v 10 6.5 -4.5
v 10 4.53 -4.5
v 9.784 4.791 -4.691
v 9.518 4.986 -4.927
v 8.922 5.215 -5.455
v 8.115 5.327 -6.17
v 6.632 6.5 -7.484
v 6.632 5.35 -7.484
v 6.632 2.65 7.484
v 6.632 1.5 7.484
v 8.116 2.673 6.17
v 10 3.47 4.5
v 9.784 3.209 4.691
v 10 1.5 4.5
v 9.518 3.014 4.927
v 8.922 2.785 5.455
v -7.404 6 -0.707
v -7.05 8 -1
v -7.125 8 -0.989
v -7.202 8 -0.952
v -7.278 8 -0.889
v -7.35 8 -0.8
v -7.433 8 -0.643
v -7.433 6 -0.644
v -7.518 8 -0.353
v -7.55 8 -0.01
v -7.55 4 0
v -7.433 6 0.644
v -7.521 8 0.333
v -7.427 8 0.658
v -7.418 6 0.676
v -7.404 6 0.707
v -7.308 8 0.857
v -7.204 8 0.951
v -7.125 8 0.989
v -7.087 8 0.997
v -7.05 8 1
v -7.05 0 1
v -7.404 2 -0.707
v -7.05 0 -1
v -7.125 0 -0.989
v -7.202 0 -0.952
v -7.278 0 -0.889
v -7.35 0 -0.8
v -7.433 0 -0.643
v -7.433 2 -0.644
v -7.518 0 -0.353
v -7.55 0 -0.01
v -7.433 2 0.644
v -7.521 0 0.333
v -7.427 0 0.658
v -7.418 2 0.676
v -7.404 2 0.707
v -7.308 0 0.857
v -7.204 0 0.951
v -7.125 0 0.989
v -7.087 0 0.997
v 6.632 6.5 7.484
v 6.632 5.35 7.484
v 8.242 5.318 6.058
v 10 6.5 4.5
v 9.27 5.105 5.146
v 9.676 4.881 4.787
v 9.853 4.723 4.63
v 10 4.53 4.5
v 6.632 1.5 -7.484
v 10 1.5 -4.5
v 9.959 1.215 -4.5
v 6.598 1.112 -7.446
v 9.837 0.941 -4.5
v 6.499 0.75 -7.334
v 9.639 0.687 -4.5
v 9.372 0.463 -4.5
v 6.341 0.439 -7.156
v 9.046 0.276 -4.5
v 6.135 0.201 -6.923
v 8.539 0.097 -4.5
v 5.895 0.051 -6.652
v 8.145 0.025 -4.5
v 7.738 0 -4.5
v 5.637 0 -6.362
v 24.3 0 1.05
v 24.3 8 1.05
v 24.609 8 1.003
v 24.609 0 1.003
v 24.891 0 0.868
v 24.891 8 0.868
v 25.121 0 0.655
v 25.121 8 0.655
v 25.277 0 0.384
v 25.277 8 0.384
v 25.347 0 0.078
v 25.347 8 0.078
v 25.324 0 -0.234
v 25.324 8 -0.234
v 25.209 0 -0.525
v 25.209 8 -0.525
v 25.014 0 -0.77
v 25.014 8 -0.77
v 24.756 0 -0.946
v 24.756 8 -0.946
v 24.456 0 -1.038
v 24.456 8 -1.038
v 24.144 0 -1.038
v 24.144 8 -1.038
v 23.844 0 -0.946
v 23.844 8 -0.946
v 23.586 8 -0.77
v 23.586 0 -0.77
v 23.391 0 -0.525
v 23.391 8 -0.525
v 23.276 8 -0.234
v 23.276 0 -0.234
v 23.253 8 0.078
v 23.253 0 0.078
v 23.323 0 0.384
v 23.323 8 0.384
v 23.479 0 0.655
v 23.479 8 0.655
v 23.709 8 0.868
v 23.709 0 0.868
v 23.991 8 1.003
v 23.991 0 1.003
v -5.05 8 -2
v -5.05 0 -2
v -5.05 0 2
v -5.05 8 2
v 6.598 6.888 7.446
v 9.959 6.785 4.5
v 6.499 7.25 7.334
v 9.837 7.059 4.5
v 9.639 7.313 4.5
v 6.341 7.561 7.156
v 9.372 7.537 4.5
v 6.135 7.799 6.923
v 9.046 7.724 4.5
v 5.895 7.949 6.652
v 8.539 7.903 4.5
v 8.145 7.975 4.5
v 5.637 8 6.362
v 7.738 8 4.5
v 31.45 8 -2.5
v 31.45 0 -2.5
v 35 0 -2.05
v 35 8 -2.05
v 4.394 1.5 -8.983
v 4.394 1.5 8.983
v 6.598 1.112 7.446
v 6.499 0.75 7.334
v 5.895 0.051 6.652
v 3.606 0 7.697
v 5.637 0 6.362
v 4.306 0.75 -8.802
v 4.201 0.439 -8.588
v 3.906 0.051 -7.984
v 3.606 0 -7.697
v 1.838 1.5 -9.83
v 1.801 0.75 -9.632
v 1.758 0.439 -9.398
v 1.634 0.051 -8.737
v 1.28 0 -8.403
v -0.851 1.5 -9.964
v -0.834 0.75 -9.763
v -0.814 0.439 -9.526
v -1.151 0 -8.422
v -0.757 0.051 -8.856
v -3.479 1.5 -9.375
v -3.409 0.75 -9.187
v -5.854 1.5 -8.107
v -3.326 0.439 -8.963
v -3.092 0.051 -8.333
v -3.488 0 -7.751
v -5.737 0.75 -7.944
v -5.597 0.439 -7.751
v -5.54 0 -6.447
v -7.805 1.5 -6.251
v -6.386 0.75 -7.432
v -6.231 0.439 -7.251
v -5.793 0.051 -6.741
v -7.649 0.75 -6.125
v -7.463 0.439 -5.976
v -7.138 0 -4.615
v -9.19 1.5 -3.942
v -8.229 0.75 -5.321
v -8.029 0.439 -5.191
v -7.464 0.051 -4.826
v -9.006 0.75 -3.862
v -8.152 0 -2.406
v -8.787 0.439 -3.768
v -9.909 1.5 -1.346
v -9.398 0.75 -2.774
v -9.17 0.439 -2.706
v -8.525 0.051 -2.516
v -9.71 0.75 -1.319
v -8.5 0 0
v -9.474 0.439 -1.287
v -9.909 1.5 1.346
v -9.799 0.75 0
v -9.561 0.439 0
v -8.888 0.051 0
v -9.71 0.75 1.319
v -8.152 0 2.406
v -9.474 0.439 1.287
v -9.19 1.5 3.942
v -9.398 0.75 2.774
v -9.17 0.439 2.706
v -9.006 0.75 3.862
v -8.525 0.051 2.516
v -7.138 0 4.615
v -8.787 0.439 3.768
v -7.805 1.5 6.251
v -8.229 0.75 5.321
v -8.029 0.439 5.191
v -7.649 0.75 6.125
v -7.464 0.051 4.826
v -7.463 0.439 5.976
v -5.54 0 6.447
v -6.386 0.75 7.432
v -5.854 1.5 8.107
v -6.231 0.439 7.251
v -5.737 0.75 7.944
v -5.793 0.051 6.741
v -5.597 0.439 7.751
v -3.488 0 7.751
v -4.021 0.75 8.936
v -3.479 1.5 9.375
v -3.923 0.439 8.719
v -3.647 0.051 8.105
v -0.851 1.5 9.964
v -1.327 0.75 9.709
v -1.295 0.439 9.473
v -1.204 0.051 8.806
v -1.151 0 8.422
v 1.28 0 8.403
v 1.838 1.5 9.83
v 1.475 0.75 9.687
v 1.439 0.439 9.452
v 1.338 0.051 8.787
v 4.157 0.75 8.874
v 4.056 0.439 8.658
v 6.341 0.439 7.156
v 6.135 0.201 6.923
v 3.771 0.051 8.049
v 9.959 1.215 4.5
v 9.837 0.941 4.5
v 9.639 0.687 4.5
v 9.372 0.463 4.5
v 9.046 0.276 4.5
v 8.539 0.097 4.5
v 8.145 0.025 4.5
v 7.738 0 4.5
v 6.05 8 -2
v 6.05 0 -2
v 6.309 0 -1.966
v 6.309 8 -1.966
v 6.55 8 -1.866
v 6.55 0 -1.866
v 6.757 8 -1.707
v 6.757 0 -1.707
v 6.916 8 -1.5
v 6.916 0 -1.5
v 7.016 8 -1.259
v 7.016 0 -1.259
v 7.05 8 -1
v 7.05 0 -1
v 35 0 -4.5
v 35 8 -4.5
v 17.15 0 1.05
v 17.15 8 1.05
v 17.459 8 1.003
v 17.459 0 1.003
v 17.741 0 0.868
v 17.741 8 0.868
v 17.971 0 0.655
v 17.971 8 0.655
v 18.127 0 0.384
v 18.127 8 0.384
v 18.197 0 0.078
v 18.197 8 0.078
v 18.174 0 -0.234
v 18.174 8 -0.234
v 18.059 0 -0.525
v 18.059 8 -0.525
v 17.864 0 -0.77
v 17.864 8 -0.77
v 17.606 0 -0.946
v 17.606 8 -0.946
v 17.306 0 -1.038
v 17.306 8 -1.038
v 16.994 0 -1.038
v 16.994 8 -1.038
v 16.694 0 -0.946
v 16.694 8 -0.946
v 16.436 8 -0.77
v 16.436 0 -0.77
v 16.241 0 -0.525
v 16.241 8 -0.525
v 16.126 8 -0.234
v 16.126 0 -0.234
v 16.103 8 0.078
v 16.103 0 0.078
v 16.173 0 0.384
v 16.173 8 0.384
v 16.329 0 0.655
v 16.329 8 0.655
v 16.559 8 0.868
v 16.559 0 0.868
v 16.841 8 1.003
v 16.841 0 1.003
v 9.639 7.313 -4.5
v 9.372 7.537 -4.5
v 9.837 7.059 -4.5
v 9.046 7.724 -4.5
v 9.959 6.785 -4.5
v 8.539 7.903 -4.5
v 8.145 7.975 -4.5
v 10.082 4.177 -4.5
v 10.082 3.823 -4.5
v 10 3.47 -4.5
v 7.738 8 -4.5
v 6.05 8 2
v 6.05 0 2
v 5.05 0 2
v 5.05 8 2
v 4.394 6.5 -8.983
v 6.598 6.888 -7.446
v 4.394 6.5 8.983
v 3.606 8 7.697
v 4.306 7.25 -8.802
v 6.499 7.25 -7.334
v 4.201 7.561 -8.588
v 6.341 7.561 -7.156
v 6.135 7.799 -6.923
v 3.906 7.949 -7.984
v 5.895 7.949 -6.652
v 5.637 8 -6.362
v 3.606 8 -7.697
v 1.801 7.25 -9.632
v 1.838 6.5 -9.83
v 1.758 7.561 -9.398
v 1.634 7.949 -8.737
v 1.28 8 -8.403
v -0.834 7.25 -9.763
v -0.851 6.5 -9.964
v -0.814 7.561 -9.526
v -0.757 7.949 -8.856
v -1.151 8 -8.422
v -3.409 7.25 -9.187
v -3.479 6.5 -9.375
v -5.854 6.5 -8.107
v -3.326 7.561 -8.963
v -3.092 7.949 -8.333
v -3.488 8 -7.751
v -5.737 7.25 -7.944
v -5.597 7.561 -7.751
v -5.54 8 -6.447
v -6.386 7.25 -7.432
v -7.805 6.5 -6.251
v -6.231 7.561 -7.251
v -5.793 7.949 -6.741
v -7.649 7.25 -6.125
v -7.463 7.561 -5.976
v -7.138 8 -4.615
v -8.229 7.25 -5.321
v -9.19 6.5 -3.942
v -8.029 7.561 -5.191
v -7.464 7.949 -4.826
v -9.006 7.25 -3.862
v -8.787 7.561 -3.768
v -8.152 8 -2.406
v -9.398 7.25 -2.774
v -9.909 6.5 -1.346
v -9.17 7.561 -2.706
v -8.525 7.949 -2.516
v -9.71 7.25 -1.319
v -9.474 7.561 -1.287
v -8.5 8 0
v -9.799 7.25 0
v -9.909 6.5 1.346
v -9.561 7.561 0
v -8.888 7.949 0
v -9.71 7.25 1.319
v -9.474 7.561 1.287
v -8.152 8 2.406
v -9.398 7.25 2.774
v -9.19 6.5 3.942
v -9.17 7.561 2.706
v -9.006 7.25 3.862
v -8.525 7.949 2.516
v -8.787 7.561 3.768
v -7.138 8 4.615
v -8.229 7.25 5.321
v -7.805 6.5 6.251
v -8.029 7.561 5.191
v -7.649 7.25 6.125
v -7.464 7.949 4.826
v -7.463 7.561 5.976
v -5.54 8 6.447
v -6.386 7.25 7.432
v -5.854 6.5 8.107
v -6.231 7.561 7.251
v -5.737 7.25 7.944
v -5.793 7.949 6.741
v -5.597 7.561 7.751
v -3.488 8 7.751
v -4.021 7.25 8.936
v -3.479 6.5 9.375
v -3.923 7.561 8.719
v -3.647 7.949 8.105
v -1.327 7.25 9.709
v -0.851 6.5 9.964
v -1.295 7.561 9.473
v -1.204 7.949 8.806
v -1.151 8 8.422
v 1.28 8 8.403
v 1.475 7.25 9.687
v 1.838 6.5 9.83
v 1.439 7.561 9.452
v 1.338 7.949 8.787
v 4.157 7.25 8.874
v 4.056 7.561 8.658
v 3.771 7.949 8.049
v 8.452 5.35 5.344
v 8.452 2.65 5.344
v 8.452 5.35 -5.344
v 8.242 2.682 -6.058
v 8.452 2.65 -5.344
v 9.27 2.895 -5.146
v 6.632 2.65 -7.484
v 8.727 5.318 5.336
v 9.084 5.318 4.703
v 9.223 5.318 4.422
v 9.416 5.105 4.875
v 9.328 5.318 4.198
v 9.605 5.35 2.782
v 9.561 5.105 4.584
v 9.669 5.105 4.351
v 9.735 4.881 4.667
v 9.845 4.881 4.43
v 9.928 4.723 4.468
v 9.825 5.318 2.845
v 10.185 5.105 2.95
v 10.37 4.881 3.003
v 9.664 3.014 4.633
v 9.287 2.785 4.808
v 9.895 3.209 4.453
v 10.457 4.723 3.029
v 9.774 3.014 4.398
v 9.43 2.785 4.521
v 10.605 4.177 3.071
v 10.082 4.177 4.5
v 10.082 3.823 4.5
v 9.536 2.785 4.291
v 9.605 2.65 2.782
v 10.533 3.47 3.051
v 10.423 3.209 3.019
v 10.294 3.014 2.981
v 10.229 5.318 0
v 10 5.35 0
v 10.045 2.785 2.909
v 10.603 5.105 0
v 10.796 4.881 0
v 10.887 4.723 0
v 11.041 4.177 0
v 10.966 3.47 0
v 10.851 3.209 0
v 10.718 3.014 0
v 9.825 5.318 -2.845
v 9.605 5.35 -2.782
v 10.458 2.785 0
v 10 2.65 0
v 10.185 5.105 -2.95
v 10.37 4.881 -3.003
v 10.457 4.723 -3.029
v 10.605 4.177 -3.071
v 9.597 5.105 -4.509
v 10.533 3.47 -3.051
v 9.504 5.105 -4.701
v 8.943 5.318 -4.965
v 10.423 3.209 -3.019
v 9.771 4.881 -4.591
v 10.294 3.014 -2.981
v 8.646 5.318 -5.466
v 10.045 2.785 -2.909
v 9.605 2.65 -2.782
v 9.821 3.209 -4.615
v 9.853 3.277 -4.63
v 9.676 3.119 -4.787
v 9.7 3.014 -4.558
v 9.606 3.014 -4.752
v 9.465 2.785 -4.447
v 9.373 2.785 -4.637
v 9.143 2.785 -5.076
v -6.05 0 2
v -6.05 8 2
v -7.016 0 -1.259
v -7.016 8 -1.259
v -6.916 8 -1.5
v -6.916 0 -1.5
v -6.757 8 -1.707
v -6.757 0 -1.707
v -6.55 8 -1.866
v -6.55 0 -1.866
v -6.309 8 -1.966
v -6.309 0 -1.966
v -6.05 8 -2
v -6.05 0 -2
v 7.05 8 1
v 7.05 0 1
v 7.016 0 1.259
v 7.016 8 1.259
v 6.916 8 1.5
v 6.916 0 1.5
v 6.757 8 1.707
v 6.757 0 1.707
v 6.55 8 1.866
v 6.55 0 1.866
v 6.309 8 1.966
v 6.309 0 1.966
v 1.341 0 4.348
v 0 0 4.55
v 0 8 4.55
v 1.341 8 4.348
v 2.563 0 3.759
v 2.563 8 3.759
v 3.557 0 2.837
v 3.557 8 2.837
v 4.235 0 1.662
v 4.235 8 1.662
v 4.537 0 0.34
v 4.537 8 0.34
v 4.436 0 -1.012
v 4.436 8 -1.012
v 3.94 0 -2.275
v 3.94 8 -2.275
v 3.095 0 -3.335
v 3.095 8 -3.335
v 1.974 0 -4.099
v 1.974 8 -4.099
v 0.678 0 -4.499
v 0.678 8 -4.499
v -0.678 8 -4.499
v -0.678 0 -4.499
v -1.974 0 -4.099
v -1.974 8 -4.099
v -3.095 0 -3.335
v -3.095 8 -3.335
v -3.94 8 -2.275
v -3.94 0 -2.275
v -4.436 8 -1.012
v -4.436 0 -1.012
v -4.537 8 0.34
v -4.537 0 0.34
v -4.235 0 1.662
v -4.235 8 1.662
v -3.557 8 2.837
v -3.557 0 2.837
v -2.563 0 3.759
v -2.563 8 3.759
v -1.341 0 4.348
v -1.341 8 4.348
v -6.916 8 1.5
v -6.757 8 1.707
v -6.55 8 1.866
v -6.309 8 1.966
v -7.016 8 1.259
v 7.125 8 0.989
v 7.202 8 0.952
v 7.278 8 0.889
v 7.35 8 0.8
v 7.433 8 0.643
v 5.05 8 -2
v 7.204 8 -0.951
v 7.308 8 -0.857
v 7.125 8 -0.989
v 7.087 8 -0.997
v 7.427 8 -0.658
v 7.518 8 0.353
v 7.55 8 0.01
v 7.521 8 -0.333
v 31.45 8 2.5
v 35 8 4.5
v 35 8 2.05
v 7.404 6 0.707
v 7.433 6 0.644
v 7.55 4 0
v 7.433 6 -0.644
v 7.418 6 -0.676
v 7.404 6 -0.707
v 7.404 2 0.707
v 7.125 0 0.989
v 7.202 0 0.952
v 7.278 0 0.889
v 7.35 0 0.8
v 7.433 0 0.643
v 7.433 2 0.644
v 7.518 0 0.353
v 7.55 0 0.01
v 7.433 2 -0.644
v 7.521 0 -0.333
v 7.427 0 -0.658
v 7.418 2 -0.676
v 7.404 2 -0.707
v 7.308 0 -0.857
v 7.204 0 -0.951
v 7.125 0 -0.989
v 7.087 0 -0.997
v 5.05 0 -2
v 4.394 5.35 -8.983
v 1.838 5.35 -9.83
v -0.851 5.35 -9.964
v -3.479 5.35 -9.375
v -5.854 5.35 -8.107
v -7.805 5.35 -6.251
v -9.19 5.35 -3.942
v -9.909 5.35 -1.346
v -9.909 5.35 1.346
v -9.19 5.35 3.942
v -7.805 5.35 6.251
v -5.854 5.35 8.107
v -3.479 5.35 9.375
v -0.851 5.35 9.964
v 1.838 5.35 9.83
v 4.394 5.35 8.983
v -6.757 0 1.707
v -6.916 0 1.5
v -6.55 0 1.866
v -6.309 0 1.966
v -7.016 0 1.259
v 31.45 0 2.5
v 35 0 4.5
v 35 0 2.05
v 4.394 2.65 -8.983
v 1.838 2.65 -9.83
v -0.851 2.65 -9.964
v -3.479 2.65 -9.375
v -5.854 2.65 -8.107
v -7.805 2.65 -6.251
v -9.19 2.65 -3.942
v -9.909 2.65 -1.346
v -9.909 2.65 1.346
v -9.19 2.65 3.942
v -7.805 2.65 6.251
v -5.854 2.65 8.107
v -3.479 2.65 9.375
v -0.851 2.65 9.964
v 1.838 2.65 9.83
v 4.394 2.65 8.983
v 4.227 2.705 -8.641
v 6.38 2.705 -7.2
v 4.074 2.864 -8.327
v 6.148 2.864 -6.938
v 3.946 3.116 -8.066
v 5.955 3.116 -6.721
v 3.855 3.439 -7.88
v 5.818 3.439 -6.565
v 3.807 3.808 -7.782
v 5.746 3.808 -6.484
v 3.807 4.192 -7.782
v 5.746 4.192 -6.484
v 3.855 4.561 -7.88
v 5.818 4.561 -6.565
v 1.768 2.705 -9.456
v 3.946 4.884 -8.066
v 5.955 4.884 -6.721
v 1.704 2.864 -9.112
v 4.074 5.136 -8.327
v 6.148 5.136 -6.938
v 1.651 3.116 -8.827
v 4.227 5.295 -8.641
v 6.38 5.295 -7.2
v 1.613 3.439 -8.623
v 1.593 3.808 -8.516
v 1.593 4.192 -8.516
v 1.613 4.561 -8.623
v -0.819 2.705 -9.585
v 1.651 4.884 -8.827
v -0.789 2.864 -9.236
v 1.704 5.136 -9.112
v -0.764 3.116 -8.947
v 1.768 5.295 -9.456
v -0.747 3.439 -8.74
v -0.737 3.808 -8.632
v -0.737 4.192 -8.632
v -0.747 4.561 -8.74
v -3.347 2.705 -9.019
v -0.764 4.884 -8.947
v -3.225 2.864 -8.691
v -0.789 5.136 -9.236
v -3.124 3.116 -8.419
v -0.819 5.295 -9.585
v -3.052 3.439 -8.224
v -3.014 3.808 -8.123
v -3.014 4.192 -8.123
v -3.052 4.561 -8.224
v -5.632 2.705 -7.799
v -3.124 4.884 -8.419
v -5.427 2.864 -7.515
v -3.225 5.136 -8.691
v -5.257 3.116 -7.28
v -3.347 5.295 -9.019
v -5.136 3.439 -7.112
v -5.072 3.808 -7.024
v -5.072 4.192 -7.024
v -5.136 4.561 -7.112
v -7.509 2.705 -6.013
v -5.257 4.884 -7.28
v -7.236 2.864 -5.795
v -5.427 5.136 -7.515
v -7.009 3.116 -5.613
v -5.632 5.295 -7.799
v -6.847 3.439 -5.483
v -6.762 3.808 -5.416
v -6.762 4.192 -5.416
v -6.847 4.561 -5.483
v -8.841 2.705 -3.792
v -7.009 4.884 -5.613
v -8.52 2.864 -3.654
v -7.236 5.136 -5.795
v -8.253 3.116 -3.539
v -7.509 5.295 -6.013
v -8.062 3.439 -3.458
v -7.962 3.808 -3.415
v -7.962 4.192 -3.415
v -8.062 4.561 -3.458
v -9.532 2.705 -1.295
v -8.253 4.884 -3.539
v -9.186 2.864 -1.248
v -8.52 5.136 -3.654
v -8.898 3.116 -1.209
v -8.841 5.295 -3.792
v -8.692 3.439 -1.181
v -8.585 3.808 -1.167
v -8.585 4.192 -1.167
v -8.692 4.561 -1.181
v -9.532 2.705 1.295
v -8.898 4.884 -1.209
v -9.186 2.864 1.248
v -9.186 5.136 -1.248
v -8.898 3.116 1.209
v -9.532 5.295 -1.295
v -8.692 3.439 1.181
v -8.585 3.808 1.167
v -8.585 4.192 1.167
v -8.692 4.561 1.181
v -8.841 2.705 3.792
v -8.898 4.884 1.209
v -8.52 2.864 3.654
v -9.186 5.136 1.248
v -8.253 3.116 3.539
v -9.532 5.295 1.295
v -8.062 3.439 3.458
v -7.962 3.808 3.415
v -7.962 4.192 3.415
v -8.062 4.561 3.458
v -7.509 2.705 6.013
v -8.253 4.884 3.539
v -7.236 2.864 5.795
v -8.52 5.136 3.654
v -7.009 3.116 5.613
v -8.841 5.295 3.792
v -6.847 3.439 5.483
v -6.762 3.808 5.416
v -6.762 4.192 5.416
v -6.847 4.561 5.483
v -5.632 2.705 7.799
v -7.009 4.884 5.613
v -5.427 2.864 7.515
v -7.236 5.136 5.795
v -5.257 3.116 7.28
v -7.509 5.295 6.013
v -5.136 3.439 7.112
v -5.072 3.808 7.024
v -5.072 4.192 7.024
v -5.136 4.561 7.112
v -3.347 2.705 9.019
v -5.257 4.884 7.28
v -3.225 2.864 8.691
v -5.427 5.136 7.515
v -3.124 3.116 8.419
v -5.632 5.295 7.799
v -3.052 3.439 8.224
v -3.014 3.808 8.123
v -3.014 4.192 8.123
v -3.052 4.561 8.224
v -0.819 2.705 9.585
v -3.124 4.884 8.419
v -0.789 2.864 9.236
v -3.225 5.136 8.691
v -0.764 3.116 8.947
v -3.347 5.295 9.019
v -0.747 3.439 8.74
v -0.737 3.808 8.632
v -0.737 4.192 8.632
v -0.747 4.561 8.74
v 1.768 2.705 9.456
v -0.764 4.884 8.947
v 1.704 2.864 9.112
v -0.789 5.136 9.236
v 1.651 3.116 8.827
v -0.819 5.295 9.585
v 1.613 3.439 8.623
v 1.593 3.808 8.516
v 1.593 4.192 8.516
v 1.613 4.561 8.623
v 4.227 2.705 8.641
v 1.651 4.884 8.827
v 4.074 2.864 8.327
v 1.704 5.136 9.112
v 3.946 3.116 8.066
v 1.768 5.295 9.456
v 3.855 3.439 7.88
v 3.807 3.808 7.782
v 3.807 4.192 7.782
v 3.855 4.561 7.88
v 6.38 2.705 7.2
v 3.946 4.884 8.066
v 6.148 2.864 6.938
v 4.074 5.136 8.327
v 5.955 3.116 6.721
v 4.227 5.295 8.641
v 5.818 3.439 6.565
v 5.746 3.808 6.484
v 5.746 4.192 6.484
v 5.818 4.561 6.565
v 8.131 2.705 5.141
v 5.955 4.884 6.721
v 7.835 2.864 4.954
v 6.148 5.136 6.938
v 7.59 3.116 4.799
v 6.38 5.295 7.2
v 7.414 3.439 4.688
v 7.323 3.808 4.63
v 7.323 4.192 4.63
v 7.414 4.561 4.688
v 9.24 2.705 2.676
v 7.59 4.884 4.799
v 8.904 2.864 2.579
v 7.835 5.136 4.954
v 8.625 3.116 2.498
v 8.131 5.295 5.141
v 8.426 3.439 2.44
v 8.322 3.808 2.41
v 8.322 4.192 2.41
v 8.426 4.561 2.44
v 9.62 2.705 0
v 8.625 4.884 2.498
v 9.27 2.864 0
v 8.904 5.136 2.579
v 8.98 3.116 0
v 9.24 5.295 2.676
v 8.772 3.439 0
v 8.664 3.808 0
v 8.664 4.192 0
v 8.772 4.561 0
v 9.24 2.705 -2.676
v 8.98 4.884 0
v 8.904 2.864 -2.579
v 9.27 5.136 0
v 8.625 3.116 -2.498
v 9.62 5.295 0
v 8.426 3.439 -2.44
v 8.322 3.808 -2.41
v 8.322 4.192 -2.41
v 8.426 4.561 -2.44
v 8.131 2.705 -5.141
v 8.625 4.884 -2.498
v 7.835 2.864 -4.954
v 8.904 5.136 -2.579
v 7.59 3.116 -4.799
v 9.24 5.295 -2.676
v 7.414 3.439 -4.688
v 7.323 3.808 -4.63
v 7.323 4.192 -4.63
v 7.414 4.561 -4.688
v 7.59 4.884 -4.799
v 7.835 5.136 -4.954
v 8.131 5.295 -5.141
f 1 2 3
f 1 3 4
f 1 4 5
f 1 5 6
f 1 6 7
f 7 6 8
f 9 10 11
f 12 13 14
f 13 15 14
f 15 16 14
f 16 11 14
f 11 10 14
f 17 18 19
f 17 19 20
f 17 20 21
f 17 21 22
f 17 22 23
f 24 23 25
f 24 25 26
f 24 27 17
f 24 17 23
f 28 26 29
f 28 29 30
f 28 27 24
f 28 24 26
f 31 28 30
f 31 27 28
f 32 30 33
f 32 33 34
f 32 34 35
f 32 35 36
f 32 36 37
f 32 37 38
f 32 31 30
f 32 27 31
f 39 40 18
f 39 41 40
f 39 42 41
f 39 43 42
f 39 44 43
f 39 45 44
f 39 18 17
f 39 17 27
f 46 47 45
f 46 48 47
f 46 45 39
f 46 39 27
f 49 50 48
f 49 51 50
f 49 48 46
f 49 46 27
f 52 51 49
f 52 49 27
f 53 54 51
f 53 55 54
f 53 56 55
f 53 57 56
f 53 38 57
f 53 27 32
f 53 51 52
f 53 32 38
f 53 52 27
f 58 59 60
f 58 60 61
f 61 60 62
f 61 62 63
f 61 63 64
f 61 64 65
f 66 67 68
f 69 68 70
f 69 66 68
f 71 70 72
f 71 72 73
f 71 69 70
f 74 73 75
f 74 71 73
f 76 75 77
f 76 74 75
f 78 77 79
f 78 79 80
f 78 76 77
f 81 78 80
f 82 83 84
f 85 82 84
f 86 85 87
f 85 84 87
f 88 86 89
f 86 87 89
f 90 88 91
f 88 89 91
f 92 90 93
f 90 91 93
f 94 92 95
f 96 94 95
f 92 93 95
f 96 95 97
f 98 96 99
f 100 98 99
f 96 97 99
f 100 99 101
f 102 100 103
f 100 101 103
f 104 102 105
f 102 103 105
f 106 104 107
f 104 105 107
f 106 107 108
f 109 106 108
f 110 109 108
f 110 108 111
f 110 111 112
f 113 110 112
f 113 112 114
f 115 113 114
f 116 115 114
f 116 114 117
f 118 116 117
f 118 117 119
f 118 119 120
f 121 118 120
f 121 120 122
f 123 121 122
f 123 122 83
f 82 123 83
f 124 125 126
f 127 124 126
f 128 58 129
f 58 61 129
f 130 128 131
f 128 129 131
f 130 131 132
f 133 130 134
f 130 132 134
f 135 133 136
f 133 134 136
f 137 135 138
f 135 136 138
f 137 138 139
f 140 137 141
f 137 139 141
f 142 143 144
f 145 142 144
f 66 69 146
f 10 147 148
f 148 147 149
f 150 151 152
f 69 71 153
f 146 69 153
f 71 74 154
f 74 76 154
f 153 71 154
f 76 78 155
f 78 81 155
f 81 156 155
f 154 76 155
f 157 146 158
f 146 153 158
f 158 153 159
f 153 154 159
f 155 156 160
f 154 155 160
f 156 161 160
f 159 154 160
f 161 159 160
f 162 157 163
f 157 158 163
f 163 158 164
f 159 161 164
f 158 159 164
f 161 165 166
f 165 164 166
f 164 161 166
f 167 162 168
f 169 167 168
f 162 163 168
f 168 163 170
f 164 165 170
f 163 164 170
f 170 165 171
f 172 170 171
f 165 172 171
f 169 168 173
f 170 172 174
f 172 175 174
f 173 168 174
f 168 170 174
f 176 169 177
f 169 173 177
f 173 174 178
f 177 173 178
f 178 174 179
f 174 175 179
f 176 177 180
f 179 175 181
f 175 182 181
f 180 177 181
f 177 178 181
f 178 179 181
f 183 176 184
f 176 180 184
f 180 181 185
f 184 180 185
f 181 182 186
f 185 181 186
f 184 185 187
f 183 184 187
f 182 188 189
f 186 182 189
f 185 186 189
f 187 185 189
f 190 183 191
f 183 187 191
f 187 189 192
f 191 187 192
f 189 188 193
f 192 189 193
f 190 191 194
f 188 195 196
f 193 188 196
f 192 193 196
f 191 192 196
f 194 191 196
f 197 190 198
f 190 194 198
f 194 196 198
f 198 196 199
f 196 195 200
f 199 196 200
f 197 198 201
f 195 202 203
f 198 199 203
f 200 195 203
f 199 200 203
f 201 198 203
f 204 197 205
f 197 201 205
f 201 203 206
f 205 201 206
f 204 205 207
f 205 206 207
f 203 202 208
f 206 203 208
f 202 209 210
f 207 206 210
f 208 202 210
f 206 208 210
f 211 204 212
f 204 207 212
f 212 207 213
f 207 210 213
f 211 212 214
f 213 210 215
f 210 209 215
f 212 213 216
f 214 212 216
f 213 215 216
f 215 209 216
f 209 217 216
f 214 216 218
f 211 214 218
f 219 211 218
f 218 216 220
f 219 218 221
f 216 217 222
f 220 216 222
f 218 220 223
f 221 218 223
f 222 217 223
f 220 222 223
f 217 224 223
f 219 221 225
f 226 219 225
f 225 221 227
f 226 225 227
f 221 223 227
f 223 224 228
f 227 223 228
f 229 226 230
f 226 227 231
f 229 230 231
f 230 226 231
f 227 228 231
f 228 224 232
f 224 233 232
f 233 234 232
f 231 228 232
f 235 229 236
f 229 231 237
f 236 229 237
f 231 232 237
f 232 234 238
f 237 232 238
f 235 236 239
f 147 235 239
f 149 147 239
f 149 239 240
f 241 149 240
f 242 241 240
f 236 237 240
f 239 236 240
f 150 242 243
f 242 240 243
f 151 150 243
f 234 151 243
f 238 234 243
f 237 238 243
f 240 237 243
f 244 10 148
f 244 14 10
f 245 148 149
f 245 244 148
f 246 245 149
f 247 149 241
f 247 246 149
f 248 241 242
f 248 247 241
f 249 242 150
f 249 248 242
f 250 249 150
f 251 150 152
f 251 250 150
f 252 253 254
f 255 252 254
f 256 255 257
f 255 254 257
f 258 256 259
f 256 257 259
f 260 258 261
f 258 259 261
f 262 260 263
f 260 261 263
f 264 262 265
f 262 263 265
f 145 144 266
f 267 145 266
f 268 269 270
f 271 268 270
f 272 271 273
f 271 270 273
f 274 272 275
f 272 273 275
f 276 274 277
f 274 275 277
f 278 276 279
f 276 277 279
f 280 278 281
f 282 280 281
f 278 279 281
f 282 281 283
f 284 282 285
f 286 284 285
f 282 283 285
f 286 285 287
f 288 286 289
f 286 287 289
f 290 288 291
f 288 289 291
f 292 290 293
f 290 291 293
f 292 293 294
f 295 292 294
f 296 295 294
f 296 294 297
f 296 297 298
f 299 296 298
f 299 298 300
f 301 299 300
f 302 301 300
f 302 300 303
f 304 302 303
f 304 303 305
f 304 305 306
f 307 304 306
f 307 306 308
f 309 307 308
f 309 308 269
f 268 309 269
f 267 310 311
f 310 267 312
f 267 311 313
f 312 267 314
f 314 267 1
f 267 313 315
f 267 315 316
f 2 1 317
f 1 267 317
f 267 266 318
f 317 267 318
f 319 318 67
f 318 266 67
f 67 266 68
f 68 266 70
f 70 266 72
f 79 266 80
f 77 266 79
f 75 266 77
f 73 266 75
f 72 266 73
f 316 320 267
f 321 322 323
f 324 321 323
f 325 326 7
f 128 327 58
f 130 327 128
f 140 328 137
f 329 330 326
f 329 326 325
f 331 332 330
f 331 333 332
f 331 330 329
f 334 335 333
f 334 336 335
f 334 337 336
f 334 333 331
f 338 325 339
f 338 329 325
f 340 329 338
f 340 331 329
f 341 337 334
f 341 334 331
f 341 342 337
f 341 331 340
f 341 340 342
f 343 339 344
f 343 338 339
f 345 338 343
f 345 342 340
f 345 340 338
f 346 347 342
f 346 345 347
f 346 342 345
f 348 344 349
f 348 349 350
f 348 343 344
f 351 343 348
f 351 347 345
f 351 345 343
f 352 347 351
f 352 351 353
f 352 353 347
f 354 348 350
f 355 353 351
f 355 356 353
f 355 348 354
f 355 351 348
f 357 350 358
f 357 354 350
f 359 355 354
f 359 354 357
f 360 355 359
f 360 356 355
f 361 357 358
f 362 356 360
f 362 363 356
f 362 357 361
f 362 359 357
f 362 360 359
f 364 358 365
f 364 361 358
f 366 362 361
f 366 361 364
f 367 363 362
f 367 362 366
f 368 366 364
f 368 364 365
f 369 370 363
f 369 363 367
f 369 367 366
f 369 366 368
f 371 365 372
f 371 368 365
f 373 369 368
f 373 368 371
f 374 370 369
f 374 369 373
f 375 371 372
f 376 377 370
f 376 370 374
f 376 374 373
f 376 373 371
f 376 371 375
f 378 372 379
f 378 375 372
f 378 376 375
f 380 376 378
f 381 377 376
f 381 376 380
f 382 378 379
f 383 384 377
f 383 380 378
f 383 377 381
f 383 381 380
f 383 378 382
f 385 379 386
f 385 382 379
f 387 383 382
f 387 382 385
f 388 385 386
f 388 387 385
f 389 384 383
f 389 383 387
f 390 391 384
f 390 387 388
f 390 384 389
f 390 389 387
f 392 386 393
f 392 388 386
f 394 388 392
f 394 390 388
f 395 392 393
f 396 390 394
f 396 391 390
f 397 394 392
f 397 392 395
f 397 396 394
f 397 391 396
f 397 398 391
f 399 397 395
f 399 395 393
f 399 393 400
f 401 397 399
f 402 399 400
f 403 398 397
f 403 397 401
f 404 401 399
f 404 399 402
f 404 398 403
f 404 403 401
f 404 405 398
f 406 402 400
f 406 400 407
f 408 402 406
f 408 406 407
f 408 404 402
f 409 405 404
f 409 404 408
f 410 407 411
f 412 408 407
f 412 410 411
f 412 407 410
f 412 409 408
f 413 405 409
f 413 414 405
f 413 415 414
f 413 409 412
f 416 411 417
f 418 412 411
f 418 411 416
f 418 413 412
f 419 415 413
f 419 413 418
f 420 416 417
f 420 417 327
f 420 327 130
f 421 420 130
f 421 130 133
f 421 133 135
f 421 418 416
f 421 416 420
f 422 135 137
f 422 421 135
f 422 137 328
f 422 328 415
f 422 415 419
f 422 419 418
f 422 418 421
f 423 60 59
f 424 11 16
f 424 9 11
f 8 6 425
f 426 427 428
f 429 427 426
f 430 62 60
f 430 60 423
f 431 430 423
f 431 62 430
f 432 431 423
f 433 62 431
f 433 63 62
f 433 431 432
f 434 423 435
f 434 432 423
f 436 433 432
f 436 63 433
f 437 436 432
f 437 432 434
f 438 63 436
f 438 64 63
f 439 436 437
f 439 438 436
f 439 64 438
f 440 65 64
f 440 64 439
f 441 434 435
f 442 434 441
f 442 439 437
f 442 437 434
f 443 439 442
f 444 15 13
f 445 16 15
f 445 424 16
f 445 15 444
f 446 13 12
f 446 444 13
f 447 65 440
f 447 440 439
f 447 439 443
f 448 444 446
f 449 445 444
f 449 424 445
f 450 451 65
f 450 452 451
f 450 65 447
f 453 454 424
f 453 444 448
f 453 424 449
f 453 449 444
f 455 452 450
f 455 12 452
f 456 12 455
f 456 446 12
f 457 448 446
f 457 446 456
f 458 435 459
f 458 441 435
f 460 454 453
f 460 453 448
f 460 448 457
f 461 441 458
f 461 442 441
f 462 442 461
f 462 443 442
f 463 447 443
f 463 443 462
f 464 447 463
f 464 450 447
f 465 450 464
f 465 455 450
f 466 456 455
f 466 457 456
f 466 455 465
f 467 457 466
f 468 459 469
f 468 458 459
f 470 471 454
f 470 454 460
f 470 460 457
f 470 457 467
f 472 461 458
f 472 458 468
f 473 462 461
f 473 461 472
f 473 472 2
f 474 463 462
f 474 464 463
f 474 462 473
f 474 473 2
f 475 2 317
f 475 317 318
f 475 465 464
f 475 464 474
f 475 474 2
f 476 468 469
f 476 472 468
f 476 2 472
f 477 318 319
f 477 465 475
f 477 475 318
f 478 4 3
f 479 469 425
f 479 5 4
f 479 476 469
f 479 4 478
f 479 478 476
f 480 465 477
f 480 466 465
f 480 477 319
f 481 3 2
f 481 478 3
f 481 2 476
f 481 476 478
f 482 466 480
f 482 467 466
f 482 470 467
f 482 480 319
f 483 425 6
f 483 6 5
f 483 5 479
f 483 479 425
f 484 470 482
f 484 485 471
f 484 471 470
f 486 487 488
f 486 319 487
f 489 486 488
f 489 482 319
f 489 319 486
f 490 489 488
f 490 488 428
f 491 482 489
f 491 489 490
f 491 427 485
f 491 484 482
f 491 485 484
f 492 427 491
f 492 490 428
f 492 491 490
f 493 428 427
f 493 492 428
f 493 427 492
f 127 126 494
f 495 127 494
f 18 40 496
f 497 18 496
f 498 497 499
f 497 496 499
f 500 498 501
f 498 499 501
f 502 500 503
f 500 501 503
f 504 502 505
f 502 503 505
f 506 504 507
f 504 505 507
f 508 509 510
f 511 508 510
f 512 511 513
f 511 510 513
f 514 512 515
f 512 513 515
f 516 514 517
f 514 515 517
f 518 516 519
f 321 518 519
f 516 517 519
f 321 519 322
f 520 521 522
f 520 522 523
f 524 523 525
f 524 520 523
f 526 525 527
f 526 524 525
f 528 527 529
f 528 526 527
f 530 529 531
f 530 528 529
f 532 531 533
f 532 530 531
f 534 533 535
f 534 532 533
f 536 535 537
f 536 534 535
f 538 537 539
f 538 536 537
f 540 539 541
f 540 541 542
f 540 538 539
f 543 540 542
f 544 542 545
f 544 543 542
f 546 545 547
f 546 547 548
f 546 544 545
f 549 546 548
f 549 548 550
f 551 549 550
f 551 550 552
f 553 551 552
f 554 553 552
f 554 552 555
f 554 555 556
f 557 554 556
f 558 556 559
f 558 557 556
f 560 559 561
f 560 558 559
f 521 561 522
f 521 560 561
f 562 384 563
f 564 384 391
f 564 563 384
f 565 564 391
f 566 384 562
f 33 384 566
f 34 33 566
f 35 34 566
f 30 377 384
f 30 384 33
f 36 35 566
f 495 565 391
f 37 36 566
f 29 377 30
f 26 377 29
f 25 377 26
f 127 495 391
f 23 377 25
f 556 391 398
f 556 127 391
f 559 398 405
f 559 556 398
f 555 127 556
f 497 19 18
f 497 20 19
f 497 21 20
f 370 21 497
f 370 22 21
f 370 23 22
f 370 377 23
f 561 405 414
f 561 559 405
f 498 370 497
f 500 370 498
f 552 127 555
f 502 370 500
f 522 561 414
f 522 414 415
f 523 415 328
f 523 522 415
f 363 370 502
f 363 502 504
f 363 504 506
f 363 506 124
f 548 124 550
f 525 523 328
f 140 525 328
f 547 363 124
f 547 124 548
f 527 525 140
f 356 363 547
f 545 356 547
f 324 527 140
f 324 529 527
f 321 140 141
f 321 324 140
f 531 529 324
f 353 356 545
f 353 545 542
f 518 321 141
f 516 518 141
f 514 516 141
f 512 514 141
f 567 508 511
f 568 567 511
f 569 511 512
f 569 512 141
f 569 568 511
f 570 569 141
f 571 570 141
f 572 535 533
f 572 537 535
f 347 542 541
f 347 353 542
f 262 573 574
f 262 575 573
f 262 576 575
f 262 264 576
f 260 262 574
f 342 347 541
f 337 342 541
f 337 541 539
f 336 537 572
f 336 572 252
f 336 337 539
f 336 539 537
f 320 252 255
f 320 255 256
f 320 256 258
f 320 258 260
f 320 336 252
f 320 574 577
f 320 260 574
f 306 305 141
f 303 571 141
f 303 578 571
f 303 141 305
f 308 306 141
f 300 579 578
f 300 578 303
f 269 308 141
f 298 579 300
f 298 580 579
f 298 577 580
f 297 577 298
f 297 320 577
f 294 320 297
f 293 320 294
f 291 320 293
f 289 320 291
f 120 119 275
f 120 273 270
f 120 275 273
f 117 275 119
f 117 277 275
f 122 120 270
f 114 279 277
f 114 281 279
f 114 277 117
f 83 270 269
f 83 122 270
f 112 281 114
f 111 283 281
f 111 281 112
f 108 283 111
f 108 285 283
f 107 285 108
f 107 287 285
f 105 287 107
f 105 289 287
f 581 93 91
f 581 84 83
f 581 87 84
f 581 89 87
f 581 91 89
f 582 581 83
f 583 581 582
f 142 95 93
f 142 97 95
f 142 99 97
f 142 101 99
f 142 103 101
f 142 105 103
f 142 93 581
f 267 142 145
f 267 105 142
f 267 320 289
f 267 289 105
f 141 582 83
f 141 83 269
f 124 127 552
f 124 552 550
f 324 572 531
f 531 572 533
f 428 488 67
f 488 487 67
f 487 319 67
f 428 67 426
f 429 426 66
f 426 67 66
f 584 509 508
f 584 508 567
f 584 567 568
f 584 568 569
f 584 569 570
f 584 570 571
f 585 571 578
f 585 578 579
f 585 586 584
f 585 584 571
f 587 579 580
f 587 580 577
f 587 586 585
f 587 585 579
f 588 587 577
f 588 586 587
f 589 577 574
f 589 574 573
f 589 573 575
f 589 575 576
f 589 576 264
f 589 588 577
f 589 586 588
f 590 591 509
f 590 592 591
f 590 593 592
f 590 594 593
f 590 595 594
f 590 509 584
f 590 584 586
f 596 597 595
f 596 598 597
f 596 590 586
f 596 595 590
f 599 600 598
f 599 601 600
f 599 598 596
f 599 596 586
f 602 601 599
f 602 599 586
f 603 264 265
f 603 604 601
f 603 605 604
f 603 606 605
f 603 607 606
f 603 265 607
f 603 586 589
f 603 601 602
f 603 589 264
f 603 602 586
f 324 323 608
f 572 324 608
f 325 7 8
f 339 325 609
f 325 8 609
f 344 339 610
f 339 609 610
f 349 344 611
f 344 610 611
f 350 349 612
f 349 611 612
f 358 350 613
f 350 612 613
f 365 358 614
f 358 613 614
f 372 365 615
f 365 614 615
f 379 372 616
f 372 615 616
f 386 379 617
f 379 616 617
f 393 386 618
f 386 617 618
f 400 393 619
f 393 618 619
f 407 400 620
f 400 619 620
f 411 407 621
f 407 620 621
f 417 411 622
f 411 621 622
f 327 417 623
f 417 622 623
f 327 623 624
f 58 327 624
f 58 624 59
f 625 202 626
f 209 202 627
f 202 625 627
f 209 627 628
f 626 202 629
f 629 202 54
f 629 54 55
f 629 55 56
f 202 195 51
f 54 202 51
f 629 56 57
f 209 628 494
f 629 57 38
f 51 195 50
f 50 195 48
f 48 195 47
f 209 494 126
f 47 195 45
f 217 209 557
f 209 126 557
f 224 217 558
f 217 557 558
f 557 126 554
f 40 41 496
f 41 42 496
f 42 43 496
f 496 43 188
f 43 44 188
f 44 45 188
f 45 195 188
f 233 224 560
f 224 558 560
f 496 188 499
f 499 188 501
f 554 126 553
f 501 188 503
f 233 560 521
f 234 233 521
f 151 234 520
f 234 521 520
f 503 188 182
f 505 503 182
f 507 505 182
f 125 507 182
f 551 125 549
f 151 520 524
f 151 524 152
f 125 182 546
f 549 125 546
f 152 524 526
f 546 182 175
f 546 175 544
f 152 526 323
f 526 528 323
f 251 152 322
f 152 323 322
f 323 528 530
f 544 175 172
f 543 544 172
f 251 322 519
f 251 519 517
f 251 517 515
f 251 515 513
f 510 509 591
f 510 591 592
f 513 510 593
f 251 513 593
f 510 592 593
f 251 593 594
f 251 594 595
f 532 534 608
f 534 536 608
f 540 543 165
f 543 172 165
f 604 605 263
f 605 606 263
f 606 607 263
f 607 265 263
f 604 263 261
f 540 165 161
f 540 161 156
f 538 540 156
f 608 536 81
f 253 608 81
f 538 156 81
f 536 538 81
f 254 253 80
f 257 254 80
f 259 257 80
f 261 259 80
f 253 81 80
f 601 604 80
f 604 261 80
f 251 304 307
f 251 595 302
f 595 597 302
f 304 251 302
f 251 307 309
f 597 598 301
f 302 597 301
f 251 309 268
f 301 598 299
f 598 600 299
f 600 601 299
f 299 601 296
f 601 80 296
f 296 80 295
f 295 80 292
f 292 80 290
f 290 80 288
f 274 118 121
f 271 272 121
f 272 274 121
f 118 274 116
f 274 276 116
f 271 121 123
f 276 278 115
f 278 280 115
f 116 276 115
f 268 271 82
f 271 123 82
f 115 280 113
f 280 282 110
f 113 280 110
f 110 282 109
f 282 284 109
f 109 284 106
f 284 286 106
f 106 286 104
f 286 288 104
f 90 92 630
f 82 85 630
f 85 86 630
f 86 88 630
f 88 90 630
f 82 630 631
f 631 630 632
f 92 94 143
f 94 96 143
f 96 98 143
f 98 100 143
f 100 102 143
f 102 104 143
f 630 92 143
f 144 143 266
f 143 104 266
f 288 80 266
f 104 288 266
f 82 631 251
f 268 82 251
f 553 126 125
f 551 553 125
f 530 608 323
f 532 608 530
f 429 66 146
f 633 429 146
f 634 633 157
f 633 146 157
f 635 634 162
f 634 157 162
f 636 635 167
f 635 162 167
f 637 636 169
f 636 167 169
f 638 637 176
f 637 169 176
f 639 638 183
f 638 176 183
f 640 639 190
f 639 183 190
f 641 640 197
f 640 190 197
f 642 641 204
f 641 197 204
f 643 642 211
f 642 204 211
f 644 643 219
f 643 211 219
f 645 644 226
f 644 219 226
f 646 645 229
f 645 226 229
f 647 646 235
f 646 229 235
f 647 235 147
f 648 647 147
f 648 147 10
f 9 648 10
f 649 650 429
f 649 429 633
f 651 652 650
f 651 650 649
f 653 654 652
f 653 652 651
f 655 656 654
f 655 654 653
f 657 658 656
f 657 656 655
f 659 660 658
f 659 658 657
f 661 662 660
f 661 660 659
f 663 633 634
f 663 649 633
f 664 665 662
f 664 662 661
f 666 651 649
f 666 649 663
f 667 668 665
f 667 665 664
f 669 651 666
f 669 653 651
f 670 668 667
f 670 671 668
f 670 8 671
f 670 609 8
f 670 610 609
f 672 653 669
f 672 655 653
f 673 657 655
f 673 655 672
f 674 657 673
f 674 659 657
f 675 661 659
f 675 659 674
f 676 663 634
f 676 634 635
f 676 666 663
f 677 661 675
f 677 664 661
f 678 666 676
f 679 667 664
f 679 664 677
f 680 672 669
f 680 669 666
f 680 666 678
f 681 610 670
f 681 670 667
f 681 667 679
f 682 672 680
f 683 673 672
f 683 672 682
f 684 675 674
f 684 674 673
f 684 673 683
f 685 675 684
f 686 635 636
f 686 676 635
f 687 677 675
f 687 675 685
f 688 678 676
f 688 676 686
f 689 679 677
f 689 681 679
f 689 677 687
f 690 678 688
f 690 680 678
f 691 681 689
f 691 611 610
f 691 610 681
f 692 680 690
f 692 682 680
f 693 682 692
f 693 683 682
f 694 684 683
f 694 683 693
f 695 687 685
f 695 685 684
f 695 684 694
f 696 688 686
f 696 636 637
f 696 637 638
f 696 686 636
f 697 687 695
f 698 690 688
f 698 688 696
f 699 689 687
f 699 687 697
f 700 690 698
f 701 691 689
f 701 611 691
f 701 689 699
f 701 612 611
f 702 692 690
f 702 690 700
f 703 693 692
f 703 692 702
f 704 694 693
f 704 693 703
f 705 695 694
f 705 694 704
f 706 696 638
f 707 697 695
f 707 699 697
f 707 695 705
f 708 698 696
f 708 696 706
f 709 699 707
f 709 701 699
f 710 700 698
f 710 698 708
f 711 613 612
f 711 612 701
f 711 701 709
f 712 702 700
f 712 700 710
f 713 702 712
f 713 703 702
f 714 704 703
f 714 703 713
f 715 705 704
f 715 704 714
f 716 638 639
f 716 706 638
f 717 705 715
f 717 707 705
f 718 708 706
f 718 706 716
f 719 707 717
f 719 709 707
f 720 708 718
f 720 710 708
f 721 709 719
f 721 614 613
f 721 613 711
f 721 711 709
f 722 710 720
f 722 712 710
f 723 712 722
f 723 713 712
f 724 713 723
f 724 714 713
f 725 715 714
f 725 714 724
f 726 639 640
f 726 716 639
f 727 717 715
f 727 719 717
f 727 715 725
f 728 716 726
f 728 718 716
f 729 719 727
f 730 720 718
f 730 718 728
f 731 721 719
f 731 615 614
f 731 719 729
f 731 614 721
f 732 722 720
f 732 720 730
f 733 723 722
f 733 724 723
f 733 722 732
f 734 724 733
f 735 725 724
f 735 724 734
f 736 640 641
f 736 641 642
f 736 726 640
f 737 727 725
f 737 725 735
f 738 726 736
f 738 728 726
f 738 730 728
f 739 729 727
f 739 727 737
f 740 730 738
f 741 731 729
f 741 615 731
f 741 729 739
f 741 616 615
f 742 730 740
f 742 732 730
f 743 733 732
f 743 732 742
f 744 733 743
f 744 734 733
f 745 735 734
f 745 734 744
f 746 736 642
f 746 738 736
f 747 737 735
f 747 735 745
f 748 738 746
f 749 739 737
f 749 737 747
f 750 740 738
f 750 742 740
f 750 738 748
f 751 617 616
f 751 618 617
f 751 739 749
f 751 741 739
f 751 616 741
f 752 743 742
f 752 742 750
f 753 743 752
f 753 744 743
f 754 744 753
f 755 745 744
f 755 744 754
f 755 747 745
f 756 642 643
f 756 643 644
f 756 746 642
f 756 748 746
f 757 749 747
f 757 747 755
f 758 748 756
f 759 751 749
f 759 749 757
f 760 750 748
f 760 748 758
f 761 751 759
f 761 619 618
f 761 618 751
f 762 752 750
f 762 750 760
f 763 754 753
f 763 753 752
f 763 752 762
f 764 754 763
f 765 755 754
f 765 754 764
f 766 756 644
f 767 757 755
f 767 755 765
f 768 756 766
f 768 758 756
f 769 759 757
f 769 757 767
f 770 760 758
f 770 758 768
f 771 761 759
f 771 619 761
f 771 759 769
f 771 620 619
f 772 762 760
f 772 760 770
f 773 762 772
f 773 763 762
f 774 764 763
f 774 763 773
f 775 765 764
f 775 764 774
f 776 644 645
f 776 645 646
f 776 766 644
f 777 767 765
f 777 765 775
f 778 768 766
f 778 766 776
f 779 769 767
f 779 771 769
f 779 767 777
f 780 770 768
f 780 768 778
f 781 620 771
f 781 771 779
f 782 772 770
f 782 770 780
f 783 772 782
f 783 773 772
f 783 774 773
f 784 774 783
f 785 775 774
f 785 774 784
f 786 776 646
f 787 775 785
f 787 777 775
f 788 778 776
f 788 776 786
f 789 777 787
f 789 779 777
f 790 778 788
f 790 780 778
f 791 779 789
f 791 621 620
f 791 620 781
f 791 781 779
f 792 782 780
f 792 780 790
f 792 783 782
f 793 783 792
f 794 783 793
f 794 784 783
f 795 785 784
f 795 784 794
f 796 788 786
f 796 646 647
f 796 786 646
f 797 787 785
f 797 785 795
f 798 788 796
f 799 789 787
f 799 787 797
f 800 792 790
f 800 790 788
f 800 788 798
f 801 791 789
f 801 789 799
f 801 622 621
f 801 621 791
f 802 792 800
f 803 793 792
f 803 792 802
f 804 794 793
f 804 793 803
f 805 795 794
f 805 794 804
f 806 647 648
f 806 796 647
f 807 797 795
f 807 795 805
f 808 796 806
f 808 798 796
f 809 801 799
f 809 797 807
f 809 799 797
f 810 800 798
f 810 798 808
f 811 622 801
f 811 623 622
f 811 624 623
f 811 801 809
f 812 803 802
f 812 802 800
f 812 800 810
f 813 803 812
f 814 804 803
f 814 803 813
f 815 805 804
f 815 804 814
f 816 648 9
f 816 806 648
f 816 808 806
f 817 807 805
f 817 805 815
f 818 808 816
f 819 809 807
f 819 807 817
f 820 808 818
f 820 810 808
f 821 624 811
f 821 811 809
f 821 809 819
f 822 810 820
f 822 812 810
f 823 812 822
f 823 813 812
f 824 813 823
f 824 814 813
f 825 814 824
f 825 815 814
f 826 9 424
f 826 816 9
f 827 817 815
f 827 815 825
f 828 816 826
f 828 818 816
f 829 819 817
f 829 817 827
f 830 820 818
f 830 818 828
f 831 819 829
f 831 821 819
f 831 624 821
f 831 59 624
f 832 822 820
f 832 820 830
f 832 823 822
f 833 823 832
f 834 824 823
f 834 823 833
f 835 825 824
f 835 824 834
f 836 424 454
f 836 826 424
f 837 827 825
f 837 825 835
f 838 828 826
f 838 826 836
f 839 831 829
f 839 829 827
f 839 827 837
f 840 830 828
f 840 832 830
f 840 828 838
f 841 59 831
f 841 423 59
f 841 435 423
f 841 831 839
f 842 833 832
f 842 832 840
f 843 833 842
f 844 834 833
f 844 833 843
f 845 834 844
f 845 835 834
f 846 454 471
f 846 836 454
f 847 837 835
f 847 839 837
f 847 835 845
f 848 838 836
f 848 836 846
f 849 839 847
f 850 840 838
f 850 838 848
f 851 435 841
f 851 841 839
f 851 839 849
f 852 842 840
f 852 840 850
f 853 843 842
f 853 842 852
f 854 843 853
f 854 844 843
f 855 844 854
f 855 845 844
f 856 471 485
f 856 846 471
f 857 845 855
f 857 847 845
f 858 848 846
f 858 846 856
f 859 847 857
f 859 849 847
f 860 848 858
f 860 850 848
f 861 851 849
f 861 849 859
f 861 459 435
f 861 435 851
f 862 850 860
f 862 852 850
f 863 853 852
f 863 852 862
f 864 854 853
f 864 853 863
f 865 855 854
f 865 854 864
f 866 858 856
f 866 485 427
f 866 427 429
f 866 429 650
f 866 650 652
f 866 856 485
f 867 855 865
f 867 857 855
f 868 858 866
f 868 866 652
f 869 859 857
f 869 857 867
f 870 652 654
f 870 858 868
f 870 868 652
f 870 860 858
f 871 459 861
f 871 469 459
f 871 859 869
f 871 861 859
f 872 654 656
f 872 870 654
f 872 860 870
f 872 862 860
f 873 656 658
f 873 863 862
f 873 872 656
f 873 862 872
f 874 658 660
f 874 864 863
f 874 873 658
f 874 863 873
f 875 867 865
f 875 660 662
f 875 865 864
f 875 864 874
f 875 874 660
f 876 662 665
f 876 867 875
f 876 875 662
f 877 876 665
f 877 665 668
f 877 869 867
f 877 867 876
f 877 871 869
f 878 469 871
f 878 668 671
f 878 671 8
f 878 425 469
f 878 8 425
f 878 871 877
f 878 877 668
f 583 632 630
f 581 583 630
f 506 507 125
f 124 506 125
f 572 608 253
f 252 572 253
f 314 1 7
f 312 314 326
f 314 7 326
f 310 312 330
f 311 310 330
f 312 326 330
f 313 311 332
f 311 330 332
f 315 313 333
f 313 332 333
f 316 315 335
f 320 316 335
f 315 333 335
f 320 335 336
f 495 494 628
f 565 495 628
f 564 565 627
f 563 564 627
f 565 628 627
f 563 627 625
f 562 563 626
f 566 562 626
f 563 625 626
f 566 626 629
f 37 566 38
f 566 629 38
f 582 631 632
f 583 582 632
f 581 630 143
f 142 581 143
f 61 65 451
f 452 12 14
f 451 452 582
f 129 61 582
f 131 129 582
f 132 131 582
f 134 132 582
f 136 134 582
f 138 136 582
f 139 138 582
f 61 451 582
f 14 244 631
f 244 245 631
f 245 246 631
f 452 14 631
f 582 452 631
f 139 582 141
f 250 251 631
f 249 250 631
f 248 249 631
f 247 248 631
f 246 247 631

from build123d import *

# Parameters (mm, degrees)
SKETCH1_R           = 4.55
BOSS_EXTRUDE2_DEPTH = 8
FILLET2_R           = 1.5
SKETCH5_R           = 1.0499999999999987
CUT_EXTRUDE1_DEPTH  = 10


with BuildPart() as part:
    # Sketch1 → Boss-Extrude2 (new body)
    with BuildSketch(Plane(origin=(0, 0, 0), x_dir=(1, 0, 0), z_dir=(0, 1, 0))):
        with BuildLine():
            Line((9.999999999999998, 4.499999999999999), (6.632016632016632, 7.484407484407484))
            ThreePointArc((6.632016632016632, 7.484407484407484), (-10, 5.67e-15), (6.6320166320166285, -7.484407484407485))
            Line((6.6320166320166285, -7.484407484407485), (10, -4.500000000000002))
            Line((10, -4.500000000000002), (35, -4.500000000000001))
            Line((35, -4.500000000000001), (35, -2.0499999999999954))
            Line((35, -2.0499999999999954), (31.450000000000006, -2.5000000000000004))
            Line((31.450000000000006, -2.5000000000000004), (31.450000000000006, 2.4999999999999987))
            Line((31.450000000000006, 2.4999999999999987), (35, 2.0499999999999954))
            Line((35, 2.0499999999999954), (35, 4.499999999999999))
            Line((35, 4.499999999999999), (9.999999999999998, 4.499999999999999))
        make_face()
        with Locations(Location((0, 0, 0), (0, 0, 270))):
            Circle(SKETCH1_R, mode=Mode.SUBTRACT)
        with BuildLine():
            Line((5.050000000000003, 2.0000000000000013), (6.050000000000003, 2.0000000000000013))
            ThreePointArc((6.050000000000003, 2.0000000000000013), (6.75710678118655, 1.7071067811865483), (7.0500000000000025, 1.000000000000001))
            add(Edge.make_bspline(
                [(7.0500000000000025, -0.9999999999999968), (7.5500000000000025, -0.9999999999999982), (7.5500000000000025, 1.34e-15), (7.550000000000002, 1.0000000000000009), (7.0500000000000025, 1.000000000000001)],
                knots=[0, 0, 0, 1.5707963267948966, 1.5707963267948966, 3.141592653589793, 3.141592653589793, 3.141592653589793], degree=2, weights=[1, 0.7071067811865476, 1, 0.7071067811865476, 1]))
            ThreePointArc((7.0500000000000025, -0.9999999999999968), (6.75710678118655, -1.707106781186544), (6.050000000000004, -1.9999999999999971))
            Line((6.050000000000004, -1.9999999999999971), (5.050000000000004, -1.9999999999999978))
            Line((5.050000000000004, -1.9999999999999978), (5.050000000000003, 2.0000000000000013))
        make_face(mode=Mode.SUBTRACT)
        with BuildLine():
            Line((-5.050000000000001, -2), (-6.050000000000001, -2))
            ThreePointArc((-6.050000000000001, -2), (-6.757106781186548, -1.7071067811865477), (-7.050000000000001, -1.0000000000000002))
            add(Edge.make_bspline(
                [(-7.050000000000001, 0.9999999999999993), (-7.550000000000002, 0.9999999999999994), (-7.550000000000001, -3.6e-16), (-7.550000000000001, -1), (-7.050000000000001, -1.0000000000000002)],
                knots=[3.141592653589793, 3.141592653589793, 3.141592653589793, 4.71238898038469, 4.71238898038469, 6.283185307179586, 6.283185307179586, 6.283185307179586], degree=2, weights=[1, 0.7071067811865476, 1, 0.7071067811865476, 1]))
            ThreePointArc((-7.050000000000001, 0.9999999999999993), (-6.757106781186549, 1.7071067811865468), (-6.050000000000002, 2))
            Line((-6.050000000000002, 2), (-5.050000000000002, 2))
            Line((-5.050000000000002, 2), (-5.050000000000001, -2))
        make_face(mode=Mode.SUBTRACT)
    extrude(amount=BOSS_EXTRUDE2_DEPTH)

    # Fillet2
    fillet2_edges = [part.edges().sort_by_distance(p)[0] for p in [
        (8.316008316008315, 8, -5.992203742203742),
        (8.316008316008315, 0, -5.992203742203742),
        (-10, 0, -1.33e-15),
        (8.316008316008315, 0, 5.992203742203744),
        (8.316008316008315, 8, 5.992203742203744),
        (-10, 8, -1.33e-15),
    ]]
    fillet(fillet2_edges, radius=FILLET2_R)

    # Sketch5 → Cut-Extrude1 (cut)
    with BuildSketch(Plane(origin=(0, 8, 0), x_dir=(1, 0, 0), z_dir=(0, 1, 0))):
        with Locations(Location((17.15, 0, 0), (0, 0, 270))):
            Circle(SKETCH5_R)
        with Locations(Location((24.300000000000004, 0, 0), (0, 0, 270))):
            Circle(SKETCH5_R)
    extrude(amount=-CUT_EXTRUDE1_DEPTH, mode=Mode.SUBTRACT)

    # Sketch4 → Cut-Revolve1 (revolve, cut)
    with BuildSketch(Plane(origin=(-6.666818896321271, 16.53530046448365, 0), x_dir=(0, 1, 0), z_dir=(0, 0, 1)), mode=Mode.PRIVATE) as cut_revolve1_sk:
        with BuildLine():
            ThreePointArc((-13.885300464483652, 3.3331811036787276), (-12.535300464483653, 1.983181103678728), (-11.185300464483651, 3.3331811036787284))
            add(Edge.make_bspline(
                [(-11.185300464483651, 3.3331811036787284), (-11.185300464483655, 4.383181103678727), (-12.535300464483653, 4.383181103678727), (-13.885300464483652, 4.383181103678727), (-13.885300464483652, 3.3331811036787276)],
                knots=[3.141592653589794, 3.141592653589794, 3.141592653589794, 4.71238898038469, 4.71238898038469, 6.283185307179586, 6.283185307179586, 6.283185307179586], degree=2, weights=[1, 0.7071067811865477, 1, 0.7071067811865477, 1]))
        make_face()
    revolve(cut_revolve1_sk.sketch.rotate(Axis((0, 0, 0), (0, 1, 0)), 228.455490636), axis=Axis((0, 0, 0), (0, 1, 0)), mode=Mode.SUBTRACT)


solid = part.part
